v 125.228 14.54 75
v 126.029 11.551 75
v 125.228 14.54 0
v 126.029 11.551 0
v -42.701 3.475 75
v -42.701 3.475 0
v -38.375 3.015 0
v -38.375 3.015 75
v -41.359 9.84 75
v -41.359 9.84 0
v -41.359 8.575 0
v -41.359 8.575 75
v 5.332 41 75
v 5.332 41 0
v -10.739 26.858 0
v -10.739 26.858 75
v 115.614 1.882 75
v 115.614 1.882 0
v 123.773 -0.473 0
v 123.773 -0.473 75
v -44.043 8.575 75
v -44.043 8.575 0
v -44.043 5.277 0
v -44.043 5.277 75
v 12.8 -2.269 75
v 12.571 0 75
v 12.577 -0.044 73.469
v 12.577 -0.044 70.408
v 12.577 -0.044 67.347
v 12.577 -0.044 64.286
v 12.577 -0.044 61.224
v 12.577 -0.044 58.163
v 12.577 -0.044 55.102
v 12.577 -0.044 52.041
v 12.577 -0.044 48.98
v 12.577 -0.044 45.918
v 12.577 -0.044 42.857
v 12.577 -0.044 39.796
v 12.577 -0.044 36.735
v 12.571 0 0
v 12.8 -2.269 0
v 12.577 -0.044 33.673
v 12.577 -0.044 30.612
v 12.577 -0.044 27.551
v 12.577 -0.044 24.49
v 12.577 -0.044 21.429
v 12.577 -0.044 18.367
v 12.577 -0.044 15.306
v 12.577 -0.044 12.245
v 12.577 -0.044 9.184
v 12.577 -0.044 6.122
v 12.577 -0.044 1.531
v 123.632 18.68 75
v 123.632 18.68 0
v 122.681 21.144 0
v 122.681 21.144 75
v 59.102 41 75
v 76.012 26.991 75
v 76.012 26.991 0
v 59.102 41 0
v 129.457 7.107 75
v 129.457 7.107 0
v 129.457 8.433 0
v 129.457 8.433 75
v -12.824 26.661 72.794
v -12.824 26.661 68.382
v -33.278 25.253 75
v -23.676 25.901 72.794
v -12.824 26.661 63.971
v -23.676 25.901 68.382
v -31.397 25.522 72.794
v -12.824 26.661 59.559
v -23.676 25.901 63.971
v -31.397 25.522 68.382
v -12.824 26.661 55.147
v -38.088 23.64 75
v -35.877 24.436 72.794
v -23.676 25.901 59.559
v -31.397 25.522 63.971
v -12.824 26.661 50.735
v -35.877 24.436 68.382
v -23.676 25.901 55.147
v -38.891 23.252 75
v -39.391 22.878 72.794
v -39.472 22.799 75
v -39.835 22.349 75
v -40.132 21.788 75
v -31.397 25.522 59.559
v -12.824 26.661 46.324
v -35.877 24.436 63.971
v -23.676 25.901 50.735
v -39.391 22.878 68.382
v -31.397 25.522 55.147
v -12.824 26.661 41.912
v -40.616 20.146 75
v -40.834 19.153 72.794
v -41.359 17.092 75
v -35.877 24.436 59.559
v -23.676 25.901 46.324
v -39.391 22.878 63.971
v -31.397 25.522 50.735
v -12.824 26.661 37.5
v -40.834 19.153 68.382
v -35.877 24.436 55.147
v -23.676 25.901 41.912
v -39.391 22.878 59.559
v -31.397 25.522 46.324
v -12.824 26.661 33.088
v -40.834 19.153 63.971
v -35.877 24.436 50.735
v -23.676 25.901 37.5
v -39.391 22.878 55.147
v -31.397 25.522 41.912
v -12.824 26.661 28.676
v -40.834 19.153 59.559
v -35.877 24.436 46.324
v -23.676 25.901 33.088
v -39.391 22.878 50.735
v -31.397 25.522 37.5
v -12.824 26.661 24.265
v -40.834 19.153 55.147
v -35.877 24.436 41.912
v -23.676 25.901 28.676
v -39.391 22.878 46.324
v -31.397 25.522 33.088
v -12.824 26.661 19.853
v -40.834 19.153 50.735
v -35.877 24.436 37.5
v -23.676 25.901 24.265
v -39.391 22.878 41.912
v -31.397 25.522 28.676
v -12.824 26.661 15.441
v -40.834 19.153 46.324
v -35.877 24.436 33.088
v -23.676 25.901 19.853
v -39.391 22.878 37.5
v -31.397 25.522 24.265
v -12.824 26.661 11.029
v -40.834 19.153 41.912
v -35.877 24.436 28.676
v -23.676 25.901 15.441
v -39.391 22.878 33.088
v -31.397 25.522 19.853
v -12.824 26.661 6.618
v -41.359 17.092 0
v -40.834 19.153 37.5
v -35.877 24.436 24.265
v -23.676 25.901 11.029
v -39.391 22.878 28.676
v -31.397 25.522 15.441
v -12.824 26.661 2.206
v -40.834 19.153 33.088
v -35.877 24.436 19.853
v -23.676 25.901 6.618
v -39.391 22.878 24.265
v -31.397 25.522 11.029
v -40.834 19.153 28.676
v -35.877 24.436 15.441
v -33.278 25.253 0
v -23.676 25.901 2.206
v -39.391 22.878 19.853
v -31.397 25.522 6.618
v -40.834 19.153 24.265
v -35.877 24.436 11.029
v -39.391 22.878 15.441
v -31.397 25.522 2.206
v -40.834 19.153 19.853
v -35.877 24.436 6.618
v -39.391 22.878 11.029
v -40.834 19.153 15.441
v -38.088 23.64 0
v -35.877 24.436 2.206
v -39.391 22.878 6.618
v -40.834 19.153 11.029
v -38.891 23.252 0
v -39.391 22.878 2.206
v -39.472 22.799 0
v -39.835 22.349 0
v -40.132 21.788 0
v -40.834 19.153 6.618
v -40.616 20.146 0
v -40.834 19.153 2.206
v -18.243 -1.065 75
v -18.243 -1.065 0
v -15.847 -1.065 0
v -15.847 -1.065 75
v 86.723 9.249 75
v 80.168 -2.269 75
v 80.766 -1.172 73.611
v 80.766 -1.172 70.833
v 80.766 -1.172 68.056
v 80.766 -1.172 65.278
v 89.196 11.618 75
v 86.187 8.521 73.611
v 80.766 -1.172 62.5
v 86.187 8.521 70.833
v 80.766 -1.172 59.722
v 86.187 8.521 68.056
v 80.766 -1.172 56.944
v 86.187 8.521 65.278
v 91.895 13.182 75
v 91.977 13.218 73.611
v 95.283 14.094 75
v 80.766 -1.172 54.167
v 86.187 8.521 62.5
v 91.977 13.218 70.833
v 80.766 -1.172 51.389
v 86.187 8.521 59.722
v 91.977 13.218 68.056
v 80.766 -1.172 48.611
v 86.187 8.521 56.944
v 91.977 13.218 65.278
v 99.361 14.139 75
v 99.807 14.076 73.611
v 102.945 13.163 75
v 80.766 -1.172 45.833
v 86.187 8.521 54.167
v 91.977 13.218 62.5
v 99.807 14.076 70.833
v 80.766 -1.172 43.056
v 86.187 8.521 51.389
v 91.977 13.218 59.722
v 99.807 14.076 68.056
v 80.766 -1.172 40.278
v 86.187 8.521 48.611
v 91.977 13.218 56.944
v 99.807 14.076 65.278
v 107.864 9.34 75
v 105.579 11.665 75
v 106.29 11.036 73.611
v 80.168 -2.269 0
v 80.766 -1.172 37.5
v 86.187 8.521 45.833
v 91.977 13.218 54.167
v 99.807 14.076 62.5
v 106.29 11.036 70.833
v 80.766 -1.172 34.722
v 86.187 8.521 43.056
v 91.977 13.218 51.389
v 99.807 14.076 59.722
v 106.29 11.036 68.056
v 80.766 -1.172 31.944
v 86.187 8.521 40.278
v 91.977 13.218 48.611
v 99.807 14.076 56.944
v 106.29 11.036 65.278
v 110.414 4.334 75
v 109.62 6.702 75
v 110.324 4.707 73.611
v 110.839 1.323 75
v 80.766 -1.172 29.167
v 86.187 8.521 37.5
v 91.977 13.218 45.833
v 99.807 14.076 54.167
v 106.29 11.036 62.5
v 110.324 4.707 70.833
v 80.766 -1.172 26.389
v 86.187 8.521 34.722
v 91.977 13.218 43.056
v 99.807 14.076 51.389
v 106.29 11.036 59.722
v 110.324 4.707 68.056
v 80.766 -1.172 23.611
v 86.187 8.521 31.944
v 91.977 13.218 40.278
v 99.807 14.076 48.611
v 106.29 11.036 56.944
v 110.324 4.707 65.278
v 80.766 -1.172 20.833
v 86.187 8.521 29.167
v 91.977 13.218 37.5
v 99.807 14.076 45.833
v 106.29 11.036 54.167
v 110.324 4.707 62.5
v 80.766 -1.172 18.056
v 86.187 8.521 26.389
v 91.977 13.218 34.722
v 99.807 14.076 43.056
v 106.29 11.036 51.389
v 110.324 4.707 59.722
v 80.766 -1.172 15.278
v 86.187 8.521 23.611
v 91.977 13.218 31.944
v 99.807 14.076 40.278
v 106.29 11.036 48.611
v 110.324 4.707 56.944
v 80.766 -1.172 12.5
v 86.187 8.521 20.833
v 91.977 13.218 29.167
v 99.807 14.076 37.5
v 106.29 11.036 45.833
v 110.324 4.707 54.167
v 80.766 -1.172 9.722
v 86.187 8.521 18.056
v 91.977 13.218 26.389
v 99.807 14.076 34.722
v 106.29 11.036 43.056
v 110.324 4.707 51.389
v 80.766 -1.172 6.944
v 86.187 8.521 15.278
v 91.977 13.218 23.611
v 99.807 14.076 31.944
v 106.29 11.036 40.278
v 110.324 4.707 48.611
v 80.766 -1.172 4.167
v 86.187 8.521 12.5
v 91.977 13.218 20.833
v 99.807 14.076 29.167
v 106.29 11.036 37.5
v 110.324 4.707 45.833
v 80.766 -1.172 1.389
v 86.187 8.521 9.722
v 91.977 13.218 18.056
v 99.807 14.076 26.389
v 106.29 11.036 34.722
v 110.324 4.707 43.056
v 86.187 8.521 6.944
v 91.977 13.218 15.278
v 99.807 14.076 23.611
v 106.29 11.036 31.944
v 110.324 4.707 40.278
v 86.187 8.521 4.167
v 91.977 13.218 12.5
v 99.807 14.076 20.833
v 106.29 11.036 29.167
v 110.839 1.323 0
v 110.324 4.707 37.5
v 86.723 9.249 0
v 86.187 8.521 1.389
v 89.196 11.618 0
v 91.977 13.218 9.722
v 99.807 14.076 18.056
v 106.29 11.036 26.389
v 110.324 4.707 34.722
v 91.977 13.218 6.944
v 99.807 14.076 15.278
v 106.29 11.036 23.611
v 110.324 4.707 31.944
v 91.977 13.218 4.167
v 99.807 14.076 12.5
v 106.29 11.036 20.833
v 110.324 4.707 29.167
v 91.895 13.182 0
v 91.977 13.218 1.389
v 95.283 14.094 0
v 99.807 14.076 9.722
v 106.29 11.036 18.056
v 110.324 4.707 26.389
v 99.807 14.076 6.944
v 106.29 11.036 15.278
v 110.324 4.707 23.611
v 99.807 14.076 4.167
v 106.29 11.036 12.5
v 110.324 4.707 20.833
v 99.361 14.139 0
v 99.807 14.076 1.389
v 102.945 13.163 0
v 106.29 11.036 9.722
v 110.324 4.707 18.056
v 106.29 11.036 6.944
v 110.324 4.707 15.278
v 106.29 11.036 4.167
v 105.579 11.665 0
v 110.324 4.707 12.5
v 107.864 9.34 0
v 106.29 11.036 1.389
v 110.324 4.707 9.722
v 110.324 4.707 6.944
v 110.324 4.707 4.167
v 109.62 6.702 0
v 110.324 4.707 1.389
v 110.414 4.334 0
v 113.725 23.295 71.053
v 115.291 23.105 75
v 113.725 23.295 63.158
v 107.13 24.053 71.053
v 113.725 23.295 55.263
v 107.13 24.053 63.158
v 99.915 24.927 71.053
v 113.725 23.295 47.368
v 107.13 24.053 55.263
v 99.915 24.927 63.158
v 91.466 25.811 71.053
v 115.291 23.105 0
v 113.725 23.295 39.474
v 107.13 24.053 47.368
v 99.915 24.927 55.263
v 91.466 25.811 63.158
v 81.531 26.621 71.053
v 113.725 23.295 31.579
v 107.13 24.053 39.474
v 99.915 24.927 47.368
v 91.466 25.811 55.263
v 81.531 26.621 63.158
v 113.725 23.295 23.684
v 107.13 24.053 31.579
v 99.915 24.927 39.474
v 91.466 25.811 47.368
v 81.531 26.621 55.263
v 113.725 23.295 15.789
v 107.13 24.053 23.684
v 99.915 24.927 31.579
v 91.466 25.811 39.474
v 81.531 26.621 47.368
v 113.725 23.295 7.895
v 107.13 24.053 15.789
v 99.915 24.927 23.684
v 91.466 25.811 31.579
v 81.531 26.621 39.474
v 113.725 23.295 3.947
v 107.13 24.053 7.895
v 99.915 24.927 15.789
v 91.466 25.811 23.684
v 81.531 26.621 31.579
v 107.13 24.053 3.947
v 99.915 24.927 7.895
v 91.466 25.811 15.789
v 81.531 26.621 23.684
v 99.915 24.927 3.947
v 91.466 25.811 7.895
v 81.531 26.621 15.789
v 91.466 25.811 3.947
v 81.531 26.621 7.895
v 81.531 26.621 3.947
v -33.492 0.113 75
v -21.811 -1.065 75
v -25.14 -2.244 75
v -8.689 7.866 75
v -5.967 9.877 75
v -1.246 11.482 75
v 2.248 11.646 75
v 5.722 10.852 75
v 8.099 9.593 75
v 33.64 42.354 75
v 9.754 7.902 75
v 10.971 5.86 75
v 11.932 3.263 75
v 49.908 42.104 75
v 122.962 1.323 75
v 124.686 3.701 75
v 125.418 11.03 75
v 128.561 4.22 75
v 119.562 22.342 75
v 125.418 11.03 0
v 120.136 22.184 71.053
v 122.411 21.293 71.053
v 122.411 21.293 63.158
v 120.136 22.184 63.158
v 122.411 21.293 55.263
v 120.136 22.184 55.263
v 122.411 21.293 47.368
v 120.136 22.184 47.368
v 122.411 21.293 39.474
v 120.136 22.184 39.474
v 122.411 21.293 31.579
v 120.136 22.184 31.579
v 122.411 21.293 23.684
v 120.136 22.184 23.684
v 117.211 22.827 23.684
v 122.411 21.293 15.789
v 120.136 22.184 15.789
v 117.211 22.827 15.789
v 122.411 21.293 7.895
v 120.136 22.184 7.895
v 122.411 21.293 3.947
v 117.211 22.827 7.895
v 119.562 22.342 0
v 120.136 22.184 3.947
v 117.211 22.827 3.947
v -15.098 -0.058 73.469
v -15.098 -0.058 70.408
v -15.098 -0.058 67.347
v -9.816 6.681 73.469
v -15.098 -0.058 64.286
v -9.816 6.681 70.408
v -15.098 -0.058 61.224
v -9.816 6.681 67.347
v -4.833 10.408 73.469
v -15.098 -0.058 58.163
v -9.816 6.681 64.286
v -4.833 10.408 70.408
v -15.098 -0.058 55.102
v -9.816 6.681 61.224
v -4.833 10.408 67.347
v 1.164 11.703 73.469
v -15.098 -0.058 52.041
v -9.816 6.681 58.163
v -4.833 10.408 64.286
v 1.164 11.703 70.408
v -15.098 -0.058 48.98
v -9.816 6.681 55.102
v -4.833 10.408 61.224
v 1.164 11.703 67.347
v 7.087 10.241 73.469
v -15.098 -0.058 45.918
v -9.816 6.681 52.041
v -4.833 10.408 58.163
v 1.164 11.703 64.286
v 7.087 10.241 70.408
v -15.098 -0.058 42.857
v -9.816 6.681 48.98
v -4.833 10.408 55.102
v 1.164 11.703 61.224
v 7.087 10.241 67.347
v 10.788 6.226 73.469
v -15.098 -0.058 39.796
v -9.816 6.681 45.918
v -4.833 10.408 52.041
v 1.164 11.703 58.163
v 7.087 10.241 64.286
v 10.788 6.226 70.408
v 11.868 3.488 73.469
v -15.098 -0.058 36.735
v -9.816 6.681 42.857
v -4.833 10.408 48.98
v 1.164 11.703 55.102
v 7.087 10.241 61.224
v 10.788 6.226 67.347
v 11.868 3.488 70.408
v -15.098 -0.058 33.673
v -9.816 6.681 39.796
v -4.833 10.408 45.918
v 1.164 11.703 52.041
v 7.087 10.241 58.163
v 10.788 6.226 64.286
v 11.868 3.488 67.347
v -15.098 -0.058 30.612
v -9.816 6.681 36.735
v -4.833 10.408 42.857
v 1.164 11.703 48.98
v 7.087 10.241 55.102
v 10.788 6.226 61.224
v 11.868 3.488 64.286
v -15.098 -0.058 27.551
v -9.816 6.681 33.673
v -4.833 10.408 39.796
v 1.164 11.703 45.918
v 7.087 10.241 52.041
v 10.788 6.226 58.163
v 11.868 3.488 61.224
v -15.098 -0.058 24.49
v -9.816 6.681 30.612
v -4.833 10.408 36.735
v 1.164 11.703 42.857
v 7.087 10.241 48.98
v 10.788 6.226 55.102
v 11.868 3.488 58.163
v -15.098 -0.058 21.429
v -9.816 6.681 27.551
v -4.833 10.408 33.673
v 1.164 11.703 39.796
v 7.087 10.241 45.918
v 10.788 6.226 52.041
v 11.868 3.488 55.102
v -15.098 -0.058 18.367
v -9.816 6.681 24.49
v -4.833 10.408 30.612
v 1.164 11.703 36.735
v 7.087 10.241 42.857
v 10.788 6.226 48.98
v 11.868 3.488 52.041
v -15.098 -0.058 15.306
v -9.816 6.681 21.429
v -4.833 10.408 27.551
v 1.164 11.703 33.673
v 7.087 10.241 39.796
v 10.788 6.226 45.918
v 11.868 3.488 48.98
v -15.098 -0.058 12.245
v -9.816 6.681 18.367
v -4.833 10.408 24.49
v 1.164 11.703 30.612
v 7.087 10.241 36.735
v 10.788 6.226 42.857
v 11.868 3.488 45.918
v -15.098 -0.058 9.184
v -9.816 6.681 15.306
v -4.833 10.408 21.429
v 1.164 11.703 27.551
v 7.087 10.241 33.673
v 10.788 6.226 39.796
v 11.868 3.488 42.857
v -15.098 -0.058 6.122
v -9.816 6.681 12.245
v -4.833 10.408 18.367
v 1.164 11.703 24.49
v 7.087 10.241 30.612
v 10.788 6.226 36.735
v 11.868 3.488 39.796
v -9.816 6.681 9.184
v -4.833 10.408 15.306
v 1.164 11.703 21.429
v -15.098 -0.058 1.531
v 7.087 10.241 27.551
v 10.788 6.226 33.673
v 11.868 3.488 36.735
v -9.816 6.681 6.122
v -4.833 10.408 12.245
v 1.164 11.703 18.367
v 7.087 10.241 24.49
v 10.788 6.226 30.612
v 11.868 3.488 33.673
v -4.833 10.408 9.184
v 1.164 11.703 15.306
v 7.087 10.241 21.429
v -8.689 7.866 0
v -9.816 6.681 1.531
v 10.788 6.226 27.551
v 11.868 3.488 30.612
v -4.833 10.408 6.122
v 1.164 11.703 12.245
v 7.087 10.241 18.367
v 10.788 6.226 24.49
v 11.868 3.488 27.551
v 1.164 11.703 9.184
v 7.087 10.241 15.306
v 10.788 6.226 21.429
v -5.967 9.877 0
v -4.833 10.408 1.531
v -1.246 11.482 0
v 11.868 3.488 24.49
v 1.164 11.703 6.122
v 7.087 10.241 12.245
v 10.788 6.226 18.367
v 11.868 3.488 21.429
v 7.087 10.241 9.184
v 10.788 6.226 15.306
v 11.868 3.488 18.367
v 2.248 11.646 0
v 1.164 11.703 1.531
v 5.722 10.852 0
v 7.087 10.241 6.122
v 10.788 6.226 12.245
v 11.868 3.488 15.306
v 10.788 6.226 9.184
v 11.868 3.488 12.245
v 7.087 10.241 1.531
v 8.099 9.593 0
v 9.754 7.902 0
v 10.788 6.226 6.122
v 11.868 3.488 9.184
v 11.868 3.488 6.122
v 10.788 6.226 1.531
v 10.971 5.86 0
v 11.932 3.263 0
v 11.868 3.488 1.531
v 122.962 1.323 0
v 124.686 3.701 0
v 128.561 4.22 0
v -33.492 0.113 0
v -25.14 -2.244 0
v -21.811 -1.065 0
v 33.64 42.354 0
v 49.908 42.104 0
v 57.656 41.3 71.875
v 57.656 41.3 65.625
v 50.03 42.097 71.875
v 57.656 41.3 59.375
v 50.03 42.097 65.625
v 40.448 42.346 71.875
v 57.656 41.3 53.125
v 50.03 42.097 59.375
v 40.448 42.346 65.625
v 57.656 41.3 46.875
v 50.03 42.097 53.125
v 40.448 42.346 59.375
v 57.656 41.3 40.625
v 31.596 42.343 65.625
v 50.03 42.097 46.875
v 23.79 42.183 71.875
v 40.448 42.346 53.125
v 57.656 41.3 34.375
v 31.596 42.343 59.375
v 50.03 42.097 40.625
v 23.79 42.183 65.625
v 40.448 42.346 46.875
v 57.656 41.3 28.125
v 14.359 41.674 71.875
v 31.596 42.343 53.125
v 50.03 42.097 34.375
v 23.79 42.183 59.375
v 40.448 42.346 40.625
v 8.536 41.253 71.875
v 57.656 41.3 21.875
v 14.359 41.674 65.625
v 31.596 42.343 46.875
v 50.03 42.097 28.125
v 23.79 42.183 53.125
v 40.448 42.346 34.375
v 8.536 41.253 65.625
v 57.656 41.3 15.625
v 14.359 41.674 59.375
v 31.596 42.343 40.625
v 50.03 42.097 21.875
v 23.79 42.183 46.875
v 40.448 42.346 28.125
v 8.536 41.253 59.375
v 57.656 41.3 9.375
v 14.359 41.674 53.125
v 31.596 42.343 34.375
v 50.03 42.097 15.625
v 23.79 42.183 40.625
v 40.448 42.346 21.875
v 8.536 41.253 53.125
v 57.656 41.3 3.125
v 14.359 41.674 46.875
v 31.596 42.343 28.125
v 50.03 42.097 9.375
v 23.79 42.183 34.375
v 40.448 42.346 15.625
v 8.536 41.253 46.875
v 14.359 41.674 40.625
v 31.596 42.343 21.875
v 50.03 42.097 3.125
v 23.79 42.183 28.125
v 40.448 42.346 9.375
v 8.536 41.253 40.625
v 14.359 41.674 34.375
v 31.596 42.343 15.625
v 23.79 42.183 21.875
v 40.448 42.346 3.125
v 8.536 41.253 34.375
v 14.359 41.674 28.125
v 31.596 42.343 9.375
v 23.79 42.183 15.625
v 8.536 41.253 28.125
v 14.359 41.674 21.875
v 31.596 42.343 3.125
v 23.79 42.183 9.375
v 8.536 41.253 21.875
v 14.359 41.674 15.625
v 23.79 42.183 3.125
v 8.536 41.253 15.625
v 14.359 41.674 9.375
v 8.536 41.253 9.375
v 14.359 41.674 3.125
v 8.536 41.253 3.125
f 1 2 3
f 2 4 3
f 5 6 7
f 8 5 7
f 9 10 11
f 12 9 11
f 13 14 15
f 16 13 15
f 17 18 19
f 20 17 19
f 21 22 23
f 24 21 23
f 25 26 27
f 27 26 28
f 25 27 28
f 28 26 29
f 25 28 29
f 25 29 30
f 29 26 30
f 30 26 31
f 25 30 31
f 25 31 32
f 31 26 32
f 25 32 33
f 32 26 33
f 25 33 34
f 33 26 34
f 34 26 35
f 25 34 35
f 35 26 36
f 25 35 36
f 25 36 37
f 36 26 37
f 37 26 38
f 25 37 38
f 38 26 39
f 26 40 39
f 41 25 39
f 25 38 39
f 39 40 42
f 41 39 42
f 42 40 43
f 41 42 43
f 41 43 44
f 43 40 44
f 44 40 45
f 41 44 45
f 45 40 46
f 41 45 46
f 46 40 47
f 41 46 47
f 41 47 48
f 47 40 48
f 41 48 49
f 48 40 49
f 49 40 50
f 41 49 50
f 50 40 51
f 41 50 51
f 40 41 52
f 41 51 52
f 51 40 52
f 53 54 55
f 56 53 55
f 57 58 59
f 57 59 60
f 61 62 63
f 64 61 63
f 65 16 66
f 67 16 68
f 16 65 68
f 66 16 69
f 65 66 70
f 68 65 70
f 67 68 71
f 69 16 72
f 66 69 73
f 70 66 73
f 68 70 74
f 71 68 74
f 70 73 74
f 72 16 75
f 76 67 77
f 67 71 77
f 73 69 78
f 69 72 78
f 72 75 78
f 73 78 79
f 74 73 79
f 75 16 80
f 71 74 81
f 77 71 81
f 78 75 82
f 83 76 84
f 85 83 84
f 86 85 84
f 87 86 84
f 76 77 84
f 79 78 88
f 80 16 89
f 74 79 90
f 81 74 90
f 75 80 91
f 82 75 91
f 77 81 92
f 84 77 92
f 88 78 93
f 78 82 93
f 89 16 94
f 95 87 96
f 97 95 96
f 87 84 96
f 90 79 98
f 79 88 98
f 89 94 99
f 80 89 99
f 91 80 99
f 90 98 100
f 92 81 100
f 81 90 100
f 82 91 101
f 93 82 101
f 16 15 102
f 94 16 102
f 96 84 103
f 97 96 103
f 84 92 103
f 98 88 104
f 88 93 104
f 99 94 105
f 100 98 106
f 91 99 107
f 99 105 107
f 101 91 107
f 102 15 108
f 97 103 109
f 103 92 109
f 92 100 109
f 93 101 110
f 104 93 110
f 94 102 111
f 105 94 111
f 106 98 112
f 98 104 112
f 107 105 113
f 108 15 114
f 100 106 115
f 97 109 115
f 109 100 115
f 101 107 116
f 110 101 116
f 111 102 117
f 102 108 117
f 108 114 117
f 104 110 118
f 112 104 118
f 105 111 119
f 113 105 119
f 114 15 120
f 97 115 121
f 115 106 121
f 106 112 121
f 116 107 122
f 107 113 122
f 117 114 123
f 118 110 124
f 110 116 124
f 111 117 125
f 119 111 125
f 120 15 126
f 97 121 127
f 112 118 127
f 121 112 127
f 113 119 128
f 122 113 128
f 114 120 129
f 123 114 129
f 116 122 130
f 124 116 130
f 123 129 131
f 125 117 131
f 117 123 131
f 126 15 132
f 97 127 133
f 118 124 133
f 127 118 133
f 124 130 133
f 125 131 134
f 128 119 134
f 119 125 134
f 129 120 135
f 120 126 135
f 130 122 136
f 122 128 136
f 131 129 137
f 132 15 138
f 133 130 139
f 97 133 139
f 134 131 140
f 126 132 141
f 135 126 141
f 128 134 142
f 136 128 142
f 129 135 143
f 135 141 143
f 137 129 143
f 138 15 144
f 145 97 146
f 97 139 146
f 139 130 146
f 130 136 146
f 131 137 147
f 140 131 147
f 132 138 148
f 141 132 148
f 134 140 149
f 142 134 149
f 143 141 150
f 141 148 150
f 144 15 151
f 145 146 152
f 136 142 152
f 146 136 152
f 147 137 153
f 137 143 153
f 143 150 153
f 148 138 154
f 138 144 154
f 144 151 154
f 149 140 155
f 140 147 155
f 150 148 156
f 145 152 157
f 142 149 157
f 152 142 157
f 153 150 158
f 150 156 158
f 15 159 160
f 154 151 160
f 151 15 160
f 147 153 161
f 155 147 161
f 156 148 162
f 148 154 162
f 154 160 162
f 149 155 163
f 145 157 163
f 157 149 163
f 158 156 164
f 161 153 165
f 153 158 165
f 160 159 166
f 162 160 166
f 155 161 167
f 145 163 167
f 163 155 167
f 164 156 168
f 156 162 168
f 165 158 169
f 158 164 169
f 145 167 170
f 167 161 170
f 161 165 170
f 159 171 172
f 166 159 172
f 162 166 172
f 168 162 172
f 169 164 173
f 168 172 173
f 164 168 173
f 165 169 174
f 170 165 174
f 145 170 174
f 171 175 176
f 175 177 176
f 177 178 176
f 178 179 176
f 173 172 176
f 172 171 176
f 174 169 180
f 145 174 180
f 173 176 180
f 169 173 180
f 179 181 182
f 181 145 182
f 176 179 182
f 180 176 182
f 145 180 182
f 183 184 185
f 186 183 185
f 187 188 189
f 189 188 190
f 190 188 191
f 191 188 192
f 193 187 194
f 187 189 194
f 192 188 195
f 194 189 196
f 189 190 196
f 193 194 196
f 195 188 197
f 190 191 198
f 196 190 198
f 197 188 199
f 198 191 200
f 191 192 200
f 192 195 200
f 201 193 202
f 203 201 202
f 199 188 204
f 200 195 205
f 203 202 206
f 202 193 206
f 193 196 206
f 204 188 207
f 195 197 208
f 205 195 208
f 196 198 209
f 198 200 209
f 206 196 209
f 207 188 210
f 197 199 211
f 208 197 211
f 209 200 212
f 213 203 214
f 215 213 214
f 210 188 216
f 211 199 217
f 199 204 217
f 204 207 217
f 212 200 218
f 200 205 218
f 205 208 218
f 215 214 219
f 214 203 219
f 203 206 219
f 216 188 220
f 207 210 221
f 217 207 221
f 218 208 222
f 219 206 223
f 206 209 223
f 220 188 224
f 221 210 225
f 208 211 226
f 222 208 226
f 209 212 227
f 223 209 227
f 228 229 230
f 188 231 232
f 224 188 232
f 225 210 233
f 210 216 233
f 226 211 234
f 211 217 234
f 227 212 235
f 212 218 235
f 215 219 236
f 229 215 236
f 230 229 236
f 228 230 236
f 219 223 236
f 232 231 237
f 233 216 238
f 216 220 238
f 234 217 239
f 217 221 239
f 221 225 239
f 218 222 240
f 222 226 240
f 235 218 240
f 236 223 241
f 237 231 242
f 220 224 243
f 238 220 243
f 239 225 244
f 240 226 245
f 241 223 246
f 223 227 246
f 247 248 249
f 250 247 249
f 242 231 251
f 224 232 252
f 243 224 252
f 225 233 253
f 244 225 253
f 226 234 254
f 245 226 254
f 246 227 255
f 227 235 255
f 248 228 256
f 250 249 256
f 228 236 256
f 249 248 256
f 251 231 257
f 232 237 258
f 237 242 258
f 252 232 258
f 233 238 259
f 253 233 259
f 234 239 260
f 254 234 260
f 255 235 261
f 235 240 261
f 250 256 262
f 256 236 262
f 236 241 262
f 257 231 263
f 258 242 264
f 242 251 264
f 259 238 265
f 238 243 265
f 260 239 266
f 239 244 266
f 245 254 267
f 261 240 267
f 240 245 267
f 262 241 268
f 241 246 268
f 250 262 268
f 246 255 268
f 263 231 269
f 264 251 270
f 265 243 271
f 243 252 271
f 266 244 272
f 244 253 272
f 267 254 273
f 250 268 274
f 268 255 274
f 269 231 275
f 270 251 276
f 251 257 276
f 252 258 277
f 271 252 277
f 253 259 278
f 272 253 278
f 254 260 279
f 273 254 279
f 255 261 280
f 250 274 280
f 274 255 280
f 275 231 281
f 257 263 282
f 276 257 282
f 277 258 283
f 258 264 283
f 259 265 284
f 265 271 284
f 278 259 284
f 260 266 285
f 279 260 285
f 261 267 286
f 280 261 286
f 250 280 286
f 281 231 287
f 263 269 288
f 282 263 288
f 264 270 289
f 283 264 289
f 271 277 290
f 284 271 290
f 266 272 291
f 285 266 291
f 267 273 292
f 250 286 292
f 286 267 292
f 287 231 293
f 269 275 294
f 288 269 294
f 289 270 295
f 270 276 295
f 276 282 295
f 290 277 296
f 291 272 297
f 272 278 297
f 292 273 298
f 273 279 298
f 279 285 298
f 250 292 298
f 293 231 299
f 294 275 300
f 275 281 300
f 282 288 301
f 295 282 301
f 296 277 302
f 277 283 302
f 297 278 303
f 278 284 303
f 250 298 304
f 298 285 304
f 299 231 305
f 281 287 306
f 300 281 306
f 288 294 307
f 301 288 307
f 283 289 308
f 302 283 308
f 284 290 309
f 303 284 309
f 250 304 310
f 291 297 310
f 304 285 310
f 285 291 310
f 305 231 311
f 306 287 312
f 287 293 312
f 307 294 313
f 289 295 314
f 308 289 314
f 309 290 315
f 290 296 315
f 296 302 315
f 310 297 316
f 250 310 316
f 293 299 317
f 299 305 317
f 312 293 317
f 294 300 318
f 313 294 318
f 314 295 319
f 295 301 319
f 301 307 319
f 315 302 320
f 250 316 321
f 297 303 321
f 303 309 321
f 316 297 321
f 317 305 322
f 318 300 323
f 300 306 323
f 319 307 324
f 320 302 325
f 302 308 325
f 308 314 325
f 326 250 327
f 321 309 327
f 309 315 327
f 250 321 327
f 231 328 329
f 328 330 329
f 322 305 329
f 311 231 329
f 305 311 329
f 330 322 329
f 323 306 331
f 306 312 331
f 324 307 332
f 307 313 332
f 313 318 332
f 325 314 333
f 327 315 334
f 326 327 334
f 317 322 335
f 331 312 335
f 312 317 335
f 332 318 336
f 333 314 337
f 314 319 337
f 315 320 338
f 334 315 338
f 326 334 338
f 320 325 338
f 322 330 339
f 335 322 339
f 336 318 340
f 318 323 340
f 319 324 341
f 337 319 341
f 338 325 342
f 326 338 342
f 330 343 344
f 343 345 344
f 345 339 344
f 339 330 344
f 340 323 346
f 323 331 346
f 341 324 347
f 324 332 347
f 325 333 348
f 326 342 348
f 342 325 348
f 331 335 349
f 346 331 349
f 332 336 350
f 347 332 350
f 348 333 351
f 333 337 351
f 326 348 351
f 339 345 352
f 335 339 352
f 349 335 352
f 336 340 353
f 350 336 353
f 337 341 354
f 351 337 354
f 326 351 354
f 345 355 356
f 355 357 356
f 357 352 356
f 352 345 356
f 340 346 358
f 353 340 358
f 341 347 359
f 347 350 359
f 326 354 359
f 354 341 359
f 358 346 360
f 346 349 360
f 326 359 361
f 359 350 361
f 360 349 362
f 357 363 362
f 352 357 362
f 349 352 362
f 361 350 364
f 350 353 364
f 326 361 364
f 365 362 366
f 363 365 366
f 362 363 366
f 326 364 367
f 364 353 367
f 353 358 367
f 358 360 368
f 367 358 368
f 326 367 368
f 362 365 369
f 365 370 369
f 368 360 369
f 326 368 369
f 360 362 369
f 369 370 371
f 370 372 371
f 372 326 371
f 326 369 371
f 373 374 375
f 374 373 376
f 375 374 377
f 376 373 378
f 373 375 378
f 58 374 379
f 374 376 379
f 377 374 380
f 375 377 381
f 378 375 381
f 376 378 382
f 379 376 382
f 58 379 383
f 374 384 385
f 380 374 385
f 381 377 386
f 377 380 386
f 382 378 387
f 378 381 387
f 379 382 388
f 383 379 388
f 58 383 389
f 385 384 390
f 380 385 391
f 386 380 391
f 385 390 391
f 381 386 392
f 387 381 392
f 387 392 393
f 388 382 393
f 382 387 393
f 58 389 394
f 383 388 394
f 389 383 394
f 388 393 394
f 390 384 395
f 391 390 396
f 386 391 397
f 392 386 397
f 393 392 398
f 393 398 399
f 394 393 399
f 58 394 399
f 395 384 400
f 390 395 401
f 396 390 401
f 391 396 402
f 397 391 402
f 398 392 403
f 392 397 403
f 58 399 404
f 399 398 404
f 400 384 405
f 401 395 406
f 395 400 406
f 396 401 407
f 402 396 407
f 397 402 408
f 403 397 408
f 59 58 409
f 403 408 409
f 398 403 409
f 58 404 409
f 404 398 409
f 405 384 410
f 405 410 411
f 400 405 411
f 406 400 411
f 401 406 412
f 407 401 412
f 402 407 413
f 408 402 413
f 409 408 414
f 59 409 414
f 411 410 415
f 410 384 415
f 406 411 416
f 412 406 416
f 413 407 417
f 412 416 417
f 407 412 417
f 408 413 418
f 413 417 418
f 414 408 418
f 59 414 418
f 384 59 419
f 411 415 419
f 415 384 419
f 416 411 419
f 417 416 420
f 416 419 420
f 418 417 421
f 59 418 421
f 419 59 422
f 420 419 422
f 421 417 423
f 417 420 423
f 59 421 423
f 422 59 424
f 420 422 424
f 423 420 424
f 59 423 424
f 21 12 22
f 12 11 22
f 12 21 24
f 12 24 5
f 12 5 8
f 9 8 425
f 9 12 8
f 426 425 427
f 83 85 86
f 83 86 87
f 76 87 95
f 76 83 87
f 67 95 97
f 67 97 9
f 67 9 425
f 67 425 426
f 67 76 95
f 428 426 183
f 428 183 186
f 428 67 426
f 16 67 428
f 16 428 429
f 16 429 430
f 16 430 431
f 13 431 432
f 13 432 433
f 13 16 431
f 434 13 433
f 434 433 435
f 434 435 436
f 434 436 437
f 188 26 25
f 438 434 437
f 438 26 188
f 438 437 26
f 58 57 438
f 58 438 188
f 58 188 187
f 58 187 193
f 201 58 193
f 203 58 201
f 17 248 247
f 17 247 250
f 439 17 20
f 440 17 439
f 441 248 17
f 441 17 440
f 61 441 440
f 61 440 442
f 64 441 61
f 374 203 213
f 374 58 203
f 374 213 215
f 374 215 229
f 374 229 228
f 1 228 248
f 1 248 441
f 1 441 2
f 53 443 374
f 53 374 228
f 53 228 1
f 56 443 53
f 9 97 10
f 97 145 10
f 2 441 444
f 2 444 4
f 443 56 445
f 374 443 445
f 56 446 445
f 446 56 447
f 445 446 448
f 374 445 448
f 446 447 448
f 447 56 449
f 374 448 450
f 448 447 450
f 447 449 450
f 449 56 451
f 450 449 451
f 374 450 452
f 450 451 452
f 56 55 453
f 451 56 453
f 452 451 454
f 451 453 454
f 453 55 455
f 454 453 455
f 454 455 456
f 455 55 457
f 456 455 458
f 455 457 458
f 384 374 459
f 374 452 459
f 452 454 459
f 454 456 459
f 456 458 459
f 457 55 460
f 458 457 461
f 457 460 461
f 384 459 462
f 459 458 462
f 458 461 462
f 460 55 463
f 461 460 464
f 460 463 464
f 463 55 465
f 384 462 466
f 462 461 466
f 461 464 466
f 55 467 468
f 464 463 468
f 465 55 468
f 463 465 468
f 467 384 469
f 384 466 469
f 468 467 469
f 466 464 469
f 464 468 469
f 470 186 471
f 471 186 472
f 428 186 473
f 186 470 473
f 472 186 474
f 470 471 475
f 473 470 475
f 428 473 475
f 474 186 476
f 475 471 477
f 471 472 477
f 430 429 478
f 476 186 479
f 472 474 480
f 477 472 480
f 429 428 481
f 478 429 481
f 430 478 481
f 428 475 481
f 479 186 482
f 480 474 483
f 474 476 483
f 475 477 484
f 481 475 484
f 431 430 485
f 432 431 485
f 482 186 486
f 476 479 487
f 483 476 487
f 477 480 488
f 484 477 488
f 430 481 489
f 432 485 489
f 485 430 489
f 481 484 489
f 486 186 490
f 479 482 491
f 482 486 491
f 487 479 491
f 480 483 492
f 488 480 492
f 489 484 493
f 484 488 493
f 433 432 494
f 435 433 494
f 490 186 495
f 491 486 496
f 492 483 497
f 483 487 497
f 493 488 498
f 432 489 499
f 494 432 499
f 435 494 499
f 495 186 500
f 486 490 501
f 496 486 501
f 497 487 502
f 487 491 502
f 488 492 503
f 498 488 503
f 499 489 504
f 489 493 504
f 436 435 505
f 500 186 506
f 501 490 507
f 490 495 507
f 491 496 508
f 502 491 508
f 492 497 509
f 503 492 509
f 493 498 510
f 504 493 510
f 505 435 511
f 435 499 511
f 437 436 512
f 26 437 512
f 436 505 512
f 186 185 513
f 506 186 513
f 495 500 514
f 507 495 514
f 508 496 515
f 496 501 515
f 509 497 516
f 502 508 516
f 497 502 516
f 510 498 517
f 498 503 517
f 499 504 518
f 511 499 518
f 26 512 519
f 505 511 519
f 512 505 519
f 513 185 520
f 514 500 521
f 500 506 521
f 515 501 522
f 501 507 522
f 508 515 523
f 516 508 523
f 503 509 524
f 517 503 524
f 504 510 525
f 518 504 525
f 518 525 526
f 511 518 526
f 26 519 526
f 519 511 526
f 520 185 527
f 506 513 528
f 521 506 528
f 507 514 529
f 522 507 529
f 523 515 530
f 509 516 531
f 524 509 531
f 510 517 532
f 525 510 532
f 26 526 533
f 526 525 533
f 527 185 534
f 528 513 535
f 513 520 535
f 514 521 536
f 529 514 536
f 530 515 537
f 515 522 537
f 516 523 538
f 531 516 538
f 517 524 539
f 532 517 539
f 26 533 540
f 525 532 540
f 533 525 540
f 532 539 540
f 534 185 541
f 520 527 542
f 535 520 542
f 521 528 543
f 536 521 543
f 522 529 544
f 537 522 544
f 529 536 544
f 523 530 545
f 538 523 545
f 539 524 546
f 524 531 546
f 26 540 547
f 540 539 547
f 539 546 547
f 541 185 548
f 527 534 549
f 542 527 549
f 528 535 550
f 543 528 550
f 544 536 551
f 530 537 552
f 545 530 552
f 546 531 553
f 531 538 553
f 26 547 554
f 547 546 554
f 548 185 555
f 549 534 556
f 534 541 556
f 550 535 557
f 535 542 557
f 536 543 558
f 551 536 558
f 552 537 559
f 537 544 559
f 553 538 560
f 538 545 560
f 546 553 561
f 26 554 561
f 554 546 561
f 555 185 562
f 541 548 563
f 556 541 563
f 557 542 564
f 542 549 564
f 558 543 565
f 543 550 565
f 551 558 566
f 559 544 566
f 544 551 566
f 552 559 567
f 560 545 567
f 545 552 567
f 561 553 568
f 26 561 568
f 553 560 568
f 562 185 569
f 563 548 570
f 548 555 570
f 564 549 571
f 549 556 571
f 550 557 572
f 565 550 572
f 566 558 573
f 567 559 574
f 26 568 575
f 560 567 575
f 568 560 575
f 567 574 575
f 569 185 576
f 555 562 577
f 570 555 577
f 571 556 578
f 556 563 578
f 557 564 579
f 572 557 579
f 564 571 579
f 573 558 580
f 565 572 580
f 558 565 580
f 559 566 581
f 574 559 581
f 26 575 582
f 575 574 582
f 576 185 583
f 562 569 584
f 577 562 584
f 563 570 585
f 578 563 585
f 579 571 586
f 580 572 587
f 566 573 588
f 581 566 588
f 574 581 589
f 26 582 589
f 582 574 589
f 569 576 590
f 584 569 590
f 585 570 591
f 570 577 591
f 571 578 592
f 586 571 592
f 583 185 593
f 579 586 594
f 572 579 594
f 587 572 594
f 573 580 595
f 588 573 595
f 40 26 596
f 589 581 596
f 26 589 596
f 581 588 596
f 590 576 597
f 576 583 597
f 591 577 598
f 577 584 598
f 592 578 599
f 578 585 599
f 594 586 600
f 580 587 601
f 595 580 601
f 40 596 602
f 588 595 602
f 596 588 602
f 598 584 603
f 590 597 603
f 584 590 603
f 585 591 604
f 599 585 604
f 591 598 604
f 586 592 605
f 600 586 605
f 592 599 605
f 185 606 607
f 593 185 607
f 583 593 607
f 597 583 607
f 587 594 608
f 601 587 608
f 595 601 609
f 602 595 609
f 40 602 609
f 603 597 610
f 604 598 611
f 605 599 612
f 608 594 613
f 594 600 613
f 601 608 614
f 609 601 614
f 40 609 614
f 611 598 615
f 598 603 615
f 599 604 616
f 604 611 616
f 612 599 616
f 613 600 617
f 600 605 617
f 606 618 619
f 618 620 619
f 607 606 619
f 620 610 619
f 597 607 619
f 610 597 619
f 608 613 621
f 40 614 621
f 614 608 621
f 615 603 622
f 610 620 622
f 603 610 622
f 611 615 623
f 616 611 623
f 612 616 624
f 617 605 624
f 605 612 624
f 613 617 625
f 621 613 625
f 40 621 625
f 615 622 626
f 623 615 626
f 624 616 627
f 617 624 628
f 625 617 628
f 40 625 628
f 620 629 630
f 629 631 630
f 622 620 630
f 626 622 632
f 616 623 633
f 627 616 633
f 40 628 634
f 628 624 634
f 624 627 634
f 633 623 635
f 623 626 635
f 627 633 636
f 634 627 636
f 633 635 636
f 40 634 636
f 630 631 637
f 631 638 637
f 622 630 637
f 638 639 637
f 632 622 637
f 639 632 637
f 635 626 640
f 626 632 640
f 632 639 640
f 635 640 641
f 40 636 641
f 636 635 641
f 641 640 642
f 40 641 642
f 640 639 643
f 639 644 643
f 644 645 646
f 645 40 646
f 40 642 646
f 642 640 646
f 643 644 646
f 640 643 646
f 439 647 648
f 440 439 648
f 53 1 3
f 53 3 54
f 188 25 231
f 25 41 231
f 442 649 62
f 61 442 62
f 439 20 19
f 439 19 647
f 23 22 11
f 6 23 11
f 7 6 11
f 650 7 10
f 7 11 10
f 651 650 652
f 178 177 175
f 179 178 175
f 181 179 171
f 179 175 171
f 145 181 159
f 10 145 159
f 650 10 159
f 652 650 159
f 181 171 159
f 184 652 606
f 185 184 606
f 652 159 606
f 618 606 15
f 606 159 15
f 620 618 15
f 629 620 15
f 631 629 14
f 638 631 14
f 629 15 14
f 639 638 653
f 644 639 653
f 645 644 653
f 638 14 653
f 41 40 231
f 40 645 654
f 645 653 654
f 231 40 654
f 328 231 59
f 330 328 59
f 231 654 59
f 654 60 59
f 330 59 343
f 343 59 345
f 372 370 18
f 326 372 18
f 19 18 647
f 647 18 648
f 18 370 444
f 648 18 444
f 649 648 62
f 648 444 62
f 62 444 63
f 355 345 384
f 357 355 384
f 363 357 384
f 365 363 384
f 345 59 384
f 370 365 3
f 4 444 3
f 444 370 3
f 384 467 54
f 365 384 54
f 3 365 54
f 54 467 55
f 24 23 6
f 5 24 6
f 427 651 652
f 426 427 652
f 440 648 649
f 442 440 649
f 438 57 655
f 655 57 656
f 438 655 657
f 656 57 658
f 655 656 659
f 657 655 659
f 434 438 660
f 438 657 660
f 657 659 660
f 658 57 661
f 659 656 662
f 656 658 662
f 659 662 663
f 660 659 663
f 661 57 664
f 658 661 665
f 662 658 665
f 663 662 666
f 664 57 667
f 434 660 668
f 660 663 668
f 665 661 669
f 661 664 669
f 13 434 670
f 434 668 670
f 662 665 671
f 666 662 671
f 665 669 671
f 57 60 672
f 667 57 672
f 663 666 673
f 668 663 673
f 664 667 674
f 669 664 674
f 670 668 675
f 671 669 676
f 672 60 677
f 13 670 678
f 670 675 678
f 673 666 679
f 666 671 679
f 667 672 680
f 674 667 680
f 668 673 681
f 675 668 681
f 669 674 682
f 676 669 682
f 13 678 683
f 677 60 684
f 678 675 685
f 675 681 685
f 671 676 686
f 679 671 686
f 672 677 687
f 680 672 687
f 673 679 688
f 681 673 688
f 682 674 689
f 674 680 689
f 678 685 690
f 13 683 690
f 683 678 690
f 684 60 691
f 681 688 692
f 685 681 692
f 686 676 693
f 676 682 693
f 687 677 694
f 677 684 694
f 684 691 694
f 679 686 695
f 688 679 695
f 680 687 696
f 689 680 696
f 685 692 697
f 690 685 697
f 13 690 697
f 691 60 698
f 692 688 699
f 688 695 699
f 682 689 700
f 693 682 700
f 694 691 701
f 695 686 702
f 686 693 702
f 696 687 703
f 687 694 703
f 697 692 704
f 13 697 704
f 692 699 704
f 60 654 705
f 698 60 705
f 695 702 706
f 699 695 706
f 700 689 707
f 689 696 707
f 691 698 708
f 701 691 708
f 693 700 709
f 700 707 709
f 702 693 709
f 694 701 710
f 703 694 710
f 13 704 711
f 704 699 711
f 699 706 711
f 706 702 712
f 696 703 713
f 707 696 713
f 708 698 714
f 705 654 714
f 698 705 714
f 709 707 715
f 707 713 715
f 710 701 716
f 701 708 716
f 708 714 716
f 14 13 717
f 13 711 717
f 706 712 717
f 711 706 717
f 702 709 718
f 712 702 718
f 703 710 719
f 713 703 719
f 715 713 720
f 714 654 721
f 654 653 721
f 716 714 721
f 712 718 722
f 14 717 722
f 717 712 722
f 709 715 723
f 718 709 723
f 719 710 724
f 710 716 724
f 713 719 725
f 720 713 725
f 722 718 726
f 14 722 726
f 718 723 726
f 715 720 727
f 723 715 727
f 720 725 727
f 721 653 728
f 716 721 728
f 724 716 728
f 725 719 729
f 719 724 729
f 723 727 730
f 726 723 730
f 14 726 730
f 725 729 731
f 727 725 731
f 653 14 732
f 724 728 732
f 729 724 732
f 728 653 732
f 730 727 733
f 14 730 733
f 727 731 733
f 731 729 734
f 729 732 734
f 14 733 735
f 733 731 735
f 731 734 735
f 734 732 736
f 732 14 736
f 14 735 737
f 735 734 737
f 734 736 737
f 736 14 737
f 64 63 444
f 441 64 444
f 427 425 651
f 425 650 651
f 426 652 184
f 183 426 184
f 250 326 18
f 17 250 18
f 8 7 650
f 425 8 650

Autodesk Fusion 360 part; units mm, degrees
sketch "Sketch1" plane through (0, 0, 0) normal (0, 0, 1) x (1, 0, 0) in component "Chassi"
  line L0 (12.8004, -2.2692) -> (80.168, -2.2692)
  line L1 (0, 0) -> (12.8004, -2.2692)
  line L2 (0, 0) -> (80.168, 0)
  line L3 (80.168, -2.2692) -> (110.8391, 1.3227)
  spline S0 degree 5 poles (80.168, -2.2692) (80.2985, -2.0305) (80.558, -1.5551) (80.9427, -0.8476) (81.4465, 0.0842) (82.0614, 1.2294) (82.6617, 2.3538) (83.2486, 3.4549) (83.8238, 4.5284) (84.3901, 5.5682) (84.9511, 6.5656) (85.512, 7.509) (86.0783, 8.3863) (86.6549, 9.1865) (87.2452, 9.9021) (87.8506, 10.5309) (88.4688, 11.0785) (89.0943, 11.5583) (89.7228, 11.9866) (90.3533, 12.3786) (90.992, 12.7445) (91.6554, 13.0851) (92.3641, 13.3943) (93.1355, 13.6635) (93.9776, 13.8841) (94.8799, 14.0514) (95.8152, 14.166) (96.749, 14.2308) (97.6493, 14.2497) (98.4938, 14.226) (99.2812, 14.1603) (100.0317, 14.05) (100.7727, 13.8917) (101.529, 13.6822) (102.311, 13.4205) (103.1037, 13.1092) (103.8778, 12.7535) (104.601, 12.3603) (105.2481, 11.9365) (105.814, 11.4891) (106.3171, 11.0228) (106.7858, 10.5399) (107.2489, 10.0382) (107.7231, 9.5102) (108.2072, 8.9423) (108.6896, 8.3184) (109.1528, 7.6217) (109.5794, 6.8375) (109.9567, 5.9552) (110.2766, 4.9682) (110.5342, 3.8727) (110.6888, 2.9081) (110.7753, 2.1348) (110.82, 1.5971) (110.8391, 1.3227) knots 0 0 0 0 0 0 0.02 0.04 0.06 0.08 0.1 0.12 0.14 0.16 0.18 0.2 0.22 0.24 0.26 0.28 0.3 0.32 0.34 0.36 0.38 0.4 0.42 0.44 0.46 0.48 0.5 0.52 0.54 0.56 0.58 0.6 0.62 0.64 0.66 0.68 0.7 0.72 0.74 0.76 0.78 0.8 0.82 0.84 0.86 0.88 0.9 0.92 0.94 0.96 0.98 1 1 1 1 1 1
  line L4 (110.8391, 1.3227) -> (115.6138, 1.8819)
  line L5 (115.6138, 1.8819) -> (123.7732, -0.4732)
  line L6 (123.7732, -0.4732) -> (122.9623, 1.3227)
  line L7 (122.9623, 1.3227) -> (124.6855, 3.7009)
  line L8 (124.6855, 3.7009) -> (128.5611, 4.2197)
  line L9 (128.5611, 4.2197) -> (129.4571, 7.1067)
  line L10 (129.4571, 7.1067) -> (129.4571, 8.4332)
  line L11 (129.4571, 8.4332) -> (125.4178, 11.0302)
  line L12 (125.4178, 11.0302) -> (126.0292, 11.5506)
  line L13 (126.0292, 11.5506) -> (125.2284, 14.54)
  line L14 (125.2284, 14.54) -> (123.6315, 18.6804)
  line L15 (123.6315, 18.6804) -> (122.6811, 21.1444)
  spline S1 degree 5 poles (122.6811, 21.1444) (122.4084, 21.3011) (121.8261, 21.6003) (120.8421, 22.0064) (119.3059, 22.461) (117.0321, 22.8948) (114.4567, 23.2202) (111.7481, 23.5162) (108.9814, 23.8279) (106.1505, 24.169) (103.2075, 24.5357) (100.0857, 24.9143) (96.7347, 25.2924) (93.1294, 25.6623) (89.2589, 26.0193) (85.1232, 26.3609) (81.606, 26.6212) (78.8532, 26.809) (76.9673, 26.931) (76.0116, 26.9912) knots 0 0 0 0 0 0 0.066667 0.133333 0.2 0.266667 0.333333 0.4 0.466667 0.533333 0.6 0.666667 0.733333 0.8 0.866667 0.933333 1 1 1 1 1 1
  line L16 (76.0116, 26.9912) -> (59.1017, 41.0003)
  line L17 (120.2247, 22.4704) -> (110.3584, 23.7393)
  spline S2 degree 5 poles (59.1017, 41.0003) (58.7775, 41.0772) (58.1019, 41.225) (57.0068, 41.4293) (55.3827, 41.6666) (53.0826, 41.9047) (50.5293, 42.0856) (47.7613, 42.2129) (44.851, 42.2939) (41.8922, 42.3389) (38.981, 42.3584) (36.1989, 42.3618) (33.596, 42.3559) (31.1693, 42.3423) (28.8609, 42.3173) (26.5831, 42.2745) (24.2368, 42.2062) (21.7313, 42.1052) (19.0054, 41.9669) (16.0226, 41.7889) (12.7642, 41.5702) (9.9319, 41.3625) (7.6808, 41.1885) (6.124, 41.0644) (5.3315, 41.0003) knots 0 0 0 0 0 0 0.05 0.1 0.15 0.2 0.25 0.3 0.35 0.4 0.45 0.5 0.55 0.6 0.65 0.7 0.75 0.8 0.85 0.9 0.95 1 1 1 1 1 1
  line L18 (5.3315, 41.0003) -> (-10.7386, 26.8578)
  spline S3 degree 5 poles (-10.7386, 26.8578) (-11.2202, 26.8108) (-12.1734, 26.7195) (-13.5733, 26.5905) (-15.3799, 26.4344) (-17.5376, 26.266) (-19.5933, 26.1236) (-21.5449, 26.0059) (-23.3898, 25.9108) (-25.1249, 25.8345) (-26.7463, 25.7716) (-28.25, 25.7147) (-29.6312, 25.654) (-30.885, 25.5768) (-32.0083, 25.4701) (-33.0027, 25.3235) (-33.8774, 25.1319) (-34.6511, 24.8982) (-35.3569, 24.6372) (-36.0361, 24.3715) (-36.7228, 24.1185) (-37.4326, 23.8815) (-38.1452, 23.6353) (-38.8146, 23.3351) (-39.3921, 22.9365) (-39.8443, 22.4108) (-40.175, 21.7644) (-40.4135, 21.027) (-40.5997, 20.238) (-40.7704, 19.4335) (-40.9471, 18.6343) (-41.1017, 18.0076) (-41.2267, 17.5462) (-41.314, 17.2424) (-41.3587, 17.0915) knots 0 0 0 0 0 0 0.033333 0.066667 0.1 0.133333 0.166667 0.2 0.233333 0.266667 0.3 0.333333 0.366667 0.4 0.433333 0.466667 0.5 0.533333 0.566667 0.6 0.633333 0.666667 0.7 0.733333 0.766667 0.8 0.833333 0.866667 0.9 0.933333 0.966667 1 1 1 1 1 1
  line L19 (-41.3587, 17.0915) -> (-41.3587, 9.8396)
  line L20 (-41.3587, 9.8396) -> (-41.3587, 8.575)
  line L21 (-41.3587, 8.575) -> (-44.0429, 8.575)
  line L22 (-44.0429, 8.575) -> (-44.0429, 5.2768)
  line L23 (-44.0429, 5.2768) -> (-42.7008, 3.4751)
  line L24 (-42.7008, 3.4751) -> (-38.3746, 3.0146)
  line L25 (-38.3746, 3.0146) -> (-33.4921, 0.1131)
  line L26 (-33.4921, 0.1131) -> (-25.1399, -2.244)
  line L27 (-25.1399, -2.244) -> (-21.8112, -1.0654)
  line L28 (-21.8112, -1.0654) -> (-18.2433, -1.0654)
  line L29 (-18.2433, -1.0654) -> (-15.8469, -1.0654)
  spline S4 degree 5 poles (-15.8469, -1.0654) (-15.6741, -0.8323) (-15.3312, -0.3704) (-14.8252, 0.3088) (-14.1671, 1.1872) (-13.3718, 2.2397) (-12.6034, 3.2458) (-11.8605, 4.2039) (-11.1409, 5.1118) (-10.441, 5.966) (-9.7559, 6.762) (-9.0789, 7.4938) (-8.4026, 8.1563) (-7.7196, 8.7458) (-7.0227, 9.2618) (-6.3064, 9.7083) (-5.5665, 10.095) (-4.8009, 10.4335) (-4.0088, 10.7347) (-3.1909, 11.0056) (-2.3494, 11.2458) (-1.4875, 11.4478) (-0.6094, 11.6009) (0.2801, 11.6943) (1.1756, 11.7203) (2.0718, 11.678) (2.9629, 11.5717) (3.8425, 11.4082) (4.7034, 11.1942) (5.5373, 10.9336) (6.3345, 10.625) (7.0852, 10.2638) (7.7812, 9.8454) (8.417, 9.3669) (8.9914, 8.8309) (9.5081, 8.2451) (9.9732, 7.6191) (10.3938, 6.9611) (10.776, 6.2748) (11.1239, 5.5569) (11.4398, 4.8) (11.7249, 3.9941) (11.9797, 3.1295) (12.2044, 2.1988) (12.3993, 1.1974) (12.5648, 0.1227) (12.6737, -0.7967) (12.7422, -1.5198) (12.782, -2.0169) (12.8004, -2.2692) knots 0 0 0 0 0 0 0.022222 0.044444 0.066667 0.088889 0.111111 0.133333 0.155556 0.177778 0.2 0.222222 0.244444 0.266667 0.288889 0.311111 0.333333 0.355556 0.377778 0.4 0.422222 0.444444 0.466667 0.488889 0.511111 0.533333 0.555556 0.577778 0.6 0.622222 0.644444 0.666667 0.688889 0.711111 0.733333 0.755556 0.777778 0.8 0.822222 0.844444 0.866667 0.888889 0.911111 0.933333 0.955556 0.977778 1 1 1 1 1 1
  point P0 (84.3652, 5.515)
  point P1 (87.6184, 10.277)
  point P2 (90.4002, 12.3987)
  point P3 (93.5591, 13.766)
  point P4 (98.1103, 14.2312)
  point P5 (101.5272, 13.6717)
  point P6 (105.0001, 12.0885)
  point P7 (107.092, 10.2058)
  point P8 (109.1491, 7.5909)
  point P9 (115.2916, 23.1048)
  point P10 (101.6899, 24.7174)
  point P11 (49.8661, 42.106)
  point P12 (34.7789, 42.3575)
  point P13 (23.9663, 42.1899)
  point P14 (-28.3345, 25.709)
  point P15 (-34.2101, 25.0235)
  point P16 (-36.952, 24.0442)
  point P17 (-39.4002, 22.8691)
  point P18 (-40.5753, 20.323)
  point P19 (-10.6489, 5.7067)
  point P20 (-7.1109, 9.1803)
  point P21 (-3.6373, 10.8528)
  point P22 (0.4796, 11.6891)
  point P23 (4.7251, 11.1745)
  point P24 (8.1344, 9.5663)
  point P25 (10.3215, 7.0576)
  point P26 (11.8011, 3.7126)
  dimension "d1" = 13
  dimension "d2" = 10.052
  dimension "d5" = 67.3676
  dimension "d7" = 30.8807
  dimension "d8" = 173.321
extrude "Extrude1" add sketch "Sketch1" along normal blind 75 contours L0 S0 L4 L5 L6 L7 L8 L9 L10 L11 L12 L13 L14 L15 S1 L16 S2 L18 S3 L19 L20 L21 L22 L23 L24 L25 L26 L27 L28 L29 S4 in component "Chassi"
component "Chassi" placed x (1, 0, 0) y (0, 1, 0) z (0, 0, 1) at (0, 0, 0)
